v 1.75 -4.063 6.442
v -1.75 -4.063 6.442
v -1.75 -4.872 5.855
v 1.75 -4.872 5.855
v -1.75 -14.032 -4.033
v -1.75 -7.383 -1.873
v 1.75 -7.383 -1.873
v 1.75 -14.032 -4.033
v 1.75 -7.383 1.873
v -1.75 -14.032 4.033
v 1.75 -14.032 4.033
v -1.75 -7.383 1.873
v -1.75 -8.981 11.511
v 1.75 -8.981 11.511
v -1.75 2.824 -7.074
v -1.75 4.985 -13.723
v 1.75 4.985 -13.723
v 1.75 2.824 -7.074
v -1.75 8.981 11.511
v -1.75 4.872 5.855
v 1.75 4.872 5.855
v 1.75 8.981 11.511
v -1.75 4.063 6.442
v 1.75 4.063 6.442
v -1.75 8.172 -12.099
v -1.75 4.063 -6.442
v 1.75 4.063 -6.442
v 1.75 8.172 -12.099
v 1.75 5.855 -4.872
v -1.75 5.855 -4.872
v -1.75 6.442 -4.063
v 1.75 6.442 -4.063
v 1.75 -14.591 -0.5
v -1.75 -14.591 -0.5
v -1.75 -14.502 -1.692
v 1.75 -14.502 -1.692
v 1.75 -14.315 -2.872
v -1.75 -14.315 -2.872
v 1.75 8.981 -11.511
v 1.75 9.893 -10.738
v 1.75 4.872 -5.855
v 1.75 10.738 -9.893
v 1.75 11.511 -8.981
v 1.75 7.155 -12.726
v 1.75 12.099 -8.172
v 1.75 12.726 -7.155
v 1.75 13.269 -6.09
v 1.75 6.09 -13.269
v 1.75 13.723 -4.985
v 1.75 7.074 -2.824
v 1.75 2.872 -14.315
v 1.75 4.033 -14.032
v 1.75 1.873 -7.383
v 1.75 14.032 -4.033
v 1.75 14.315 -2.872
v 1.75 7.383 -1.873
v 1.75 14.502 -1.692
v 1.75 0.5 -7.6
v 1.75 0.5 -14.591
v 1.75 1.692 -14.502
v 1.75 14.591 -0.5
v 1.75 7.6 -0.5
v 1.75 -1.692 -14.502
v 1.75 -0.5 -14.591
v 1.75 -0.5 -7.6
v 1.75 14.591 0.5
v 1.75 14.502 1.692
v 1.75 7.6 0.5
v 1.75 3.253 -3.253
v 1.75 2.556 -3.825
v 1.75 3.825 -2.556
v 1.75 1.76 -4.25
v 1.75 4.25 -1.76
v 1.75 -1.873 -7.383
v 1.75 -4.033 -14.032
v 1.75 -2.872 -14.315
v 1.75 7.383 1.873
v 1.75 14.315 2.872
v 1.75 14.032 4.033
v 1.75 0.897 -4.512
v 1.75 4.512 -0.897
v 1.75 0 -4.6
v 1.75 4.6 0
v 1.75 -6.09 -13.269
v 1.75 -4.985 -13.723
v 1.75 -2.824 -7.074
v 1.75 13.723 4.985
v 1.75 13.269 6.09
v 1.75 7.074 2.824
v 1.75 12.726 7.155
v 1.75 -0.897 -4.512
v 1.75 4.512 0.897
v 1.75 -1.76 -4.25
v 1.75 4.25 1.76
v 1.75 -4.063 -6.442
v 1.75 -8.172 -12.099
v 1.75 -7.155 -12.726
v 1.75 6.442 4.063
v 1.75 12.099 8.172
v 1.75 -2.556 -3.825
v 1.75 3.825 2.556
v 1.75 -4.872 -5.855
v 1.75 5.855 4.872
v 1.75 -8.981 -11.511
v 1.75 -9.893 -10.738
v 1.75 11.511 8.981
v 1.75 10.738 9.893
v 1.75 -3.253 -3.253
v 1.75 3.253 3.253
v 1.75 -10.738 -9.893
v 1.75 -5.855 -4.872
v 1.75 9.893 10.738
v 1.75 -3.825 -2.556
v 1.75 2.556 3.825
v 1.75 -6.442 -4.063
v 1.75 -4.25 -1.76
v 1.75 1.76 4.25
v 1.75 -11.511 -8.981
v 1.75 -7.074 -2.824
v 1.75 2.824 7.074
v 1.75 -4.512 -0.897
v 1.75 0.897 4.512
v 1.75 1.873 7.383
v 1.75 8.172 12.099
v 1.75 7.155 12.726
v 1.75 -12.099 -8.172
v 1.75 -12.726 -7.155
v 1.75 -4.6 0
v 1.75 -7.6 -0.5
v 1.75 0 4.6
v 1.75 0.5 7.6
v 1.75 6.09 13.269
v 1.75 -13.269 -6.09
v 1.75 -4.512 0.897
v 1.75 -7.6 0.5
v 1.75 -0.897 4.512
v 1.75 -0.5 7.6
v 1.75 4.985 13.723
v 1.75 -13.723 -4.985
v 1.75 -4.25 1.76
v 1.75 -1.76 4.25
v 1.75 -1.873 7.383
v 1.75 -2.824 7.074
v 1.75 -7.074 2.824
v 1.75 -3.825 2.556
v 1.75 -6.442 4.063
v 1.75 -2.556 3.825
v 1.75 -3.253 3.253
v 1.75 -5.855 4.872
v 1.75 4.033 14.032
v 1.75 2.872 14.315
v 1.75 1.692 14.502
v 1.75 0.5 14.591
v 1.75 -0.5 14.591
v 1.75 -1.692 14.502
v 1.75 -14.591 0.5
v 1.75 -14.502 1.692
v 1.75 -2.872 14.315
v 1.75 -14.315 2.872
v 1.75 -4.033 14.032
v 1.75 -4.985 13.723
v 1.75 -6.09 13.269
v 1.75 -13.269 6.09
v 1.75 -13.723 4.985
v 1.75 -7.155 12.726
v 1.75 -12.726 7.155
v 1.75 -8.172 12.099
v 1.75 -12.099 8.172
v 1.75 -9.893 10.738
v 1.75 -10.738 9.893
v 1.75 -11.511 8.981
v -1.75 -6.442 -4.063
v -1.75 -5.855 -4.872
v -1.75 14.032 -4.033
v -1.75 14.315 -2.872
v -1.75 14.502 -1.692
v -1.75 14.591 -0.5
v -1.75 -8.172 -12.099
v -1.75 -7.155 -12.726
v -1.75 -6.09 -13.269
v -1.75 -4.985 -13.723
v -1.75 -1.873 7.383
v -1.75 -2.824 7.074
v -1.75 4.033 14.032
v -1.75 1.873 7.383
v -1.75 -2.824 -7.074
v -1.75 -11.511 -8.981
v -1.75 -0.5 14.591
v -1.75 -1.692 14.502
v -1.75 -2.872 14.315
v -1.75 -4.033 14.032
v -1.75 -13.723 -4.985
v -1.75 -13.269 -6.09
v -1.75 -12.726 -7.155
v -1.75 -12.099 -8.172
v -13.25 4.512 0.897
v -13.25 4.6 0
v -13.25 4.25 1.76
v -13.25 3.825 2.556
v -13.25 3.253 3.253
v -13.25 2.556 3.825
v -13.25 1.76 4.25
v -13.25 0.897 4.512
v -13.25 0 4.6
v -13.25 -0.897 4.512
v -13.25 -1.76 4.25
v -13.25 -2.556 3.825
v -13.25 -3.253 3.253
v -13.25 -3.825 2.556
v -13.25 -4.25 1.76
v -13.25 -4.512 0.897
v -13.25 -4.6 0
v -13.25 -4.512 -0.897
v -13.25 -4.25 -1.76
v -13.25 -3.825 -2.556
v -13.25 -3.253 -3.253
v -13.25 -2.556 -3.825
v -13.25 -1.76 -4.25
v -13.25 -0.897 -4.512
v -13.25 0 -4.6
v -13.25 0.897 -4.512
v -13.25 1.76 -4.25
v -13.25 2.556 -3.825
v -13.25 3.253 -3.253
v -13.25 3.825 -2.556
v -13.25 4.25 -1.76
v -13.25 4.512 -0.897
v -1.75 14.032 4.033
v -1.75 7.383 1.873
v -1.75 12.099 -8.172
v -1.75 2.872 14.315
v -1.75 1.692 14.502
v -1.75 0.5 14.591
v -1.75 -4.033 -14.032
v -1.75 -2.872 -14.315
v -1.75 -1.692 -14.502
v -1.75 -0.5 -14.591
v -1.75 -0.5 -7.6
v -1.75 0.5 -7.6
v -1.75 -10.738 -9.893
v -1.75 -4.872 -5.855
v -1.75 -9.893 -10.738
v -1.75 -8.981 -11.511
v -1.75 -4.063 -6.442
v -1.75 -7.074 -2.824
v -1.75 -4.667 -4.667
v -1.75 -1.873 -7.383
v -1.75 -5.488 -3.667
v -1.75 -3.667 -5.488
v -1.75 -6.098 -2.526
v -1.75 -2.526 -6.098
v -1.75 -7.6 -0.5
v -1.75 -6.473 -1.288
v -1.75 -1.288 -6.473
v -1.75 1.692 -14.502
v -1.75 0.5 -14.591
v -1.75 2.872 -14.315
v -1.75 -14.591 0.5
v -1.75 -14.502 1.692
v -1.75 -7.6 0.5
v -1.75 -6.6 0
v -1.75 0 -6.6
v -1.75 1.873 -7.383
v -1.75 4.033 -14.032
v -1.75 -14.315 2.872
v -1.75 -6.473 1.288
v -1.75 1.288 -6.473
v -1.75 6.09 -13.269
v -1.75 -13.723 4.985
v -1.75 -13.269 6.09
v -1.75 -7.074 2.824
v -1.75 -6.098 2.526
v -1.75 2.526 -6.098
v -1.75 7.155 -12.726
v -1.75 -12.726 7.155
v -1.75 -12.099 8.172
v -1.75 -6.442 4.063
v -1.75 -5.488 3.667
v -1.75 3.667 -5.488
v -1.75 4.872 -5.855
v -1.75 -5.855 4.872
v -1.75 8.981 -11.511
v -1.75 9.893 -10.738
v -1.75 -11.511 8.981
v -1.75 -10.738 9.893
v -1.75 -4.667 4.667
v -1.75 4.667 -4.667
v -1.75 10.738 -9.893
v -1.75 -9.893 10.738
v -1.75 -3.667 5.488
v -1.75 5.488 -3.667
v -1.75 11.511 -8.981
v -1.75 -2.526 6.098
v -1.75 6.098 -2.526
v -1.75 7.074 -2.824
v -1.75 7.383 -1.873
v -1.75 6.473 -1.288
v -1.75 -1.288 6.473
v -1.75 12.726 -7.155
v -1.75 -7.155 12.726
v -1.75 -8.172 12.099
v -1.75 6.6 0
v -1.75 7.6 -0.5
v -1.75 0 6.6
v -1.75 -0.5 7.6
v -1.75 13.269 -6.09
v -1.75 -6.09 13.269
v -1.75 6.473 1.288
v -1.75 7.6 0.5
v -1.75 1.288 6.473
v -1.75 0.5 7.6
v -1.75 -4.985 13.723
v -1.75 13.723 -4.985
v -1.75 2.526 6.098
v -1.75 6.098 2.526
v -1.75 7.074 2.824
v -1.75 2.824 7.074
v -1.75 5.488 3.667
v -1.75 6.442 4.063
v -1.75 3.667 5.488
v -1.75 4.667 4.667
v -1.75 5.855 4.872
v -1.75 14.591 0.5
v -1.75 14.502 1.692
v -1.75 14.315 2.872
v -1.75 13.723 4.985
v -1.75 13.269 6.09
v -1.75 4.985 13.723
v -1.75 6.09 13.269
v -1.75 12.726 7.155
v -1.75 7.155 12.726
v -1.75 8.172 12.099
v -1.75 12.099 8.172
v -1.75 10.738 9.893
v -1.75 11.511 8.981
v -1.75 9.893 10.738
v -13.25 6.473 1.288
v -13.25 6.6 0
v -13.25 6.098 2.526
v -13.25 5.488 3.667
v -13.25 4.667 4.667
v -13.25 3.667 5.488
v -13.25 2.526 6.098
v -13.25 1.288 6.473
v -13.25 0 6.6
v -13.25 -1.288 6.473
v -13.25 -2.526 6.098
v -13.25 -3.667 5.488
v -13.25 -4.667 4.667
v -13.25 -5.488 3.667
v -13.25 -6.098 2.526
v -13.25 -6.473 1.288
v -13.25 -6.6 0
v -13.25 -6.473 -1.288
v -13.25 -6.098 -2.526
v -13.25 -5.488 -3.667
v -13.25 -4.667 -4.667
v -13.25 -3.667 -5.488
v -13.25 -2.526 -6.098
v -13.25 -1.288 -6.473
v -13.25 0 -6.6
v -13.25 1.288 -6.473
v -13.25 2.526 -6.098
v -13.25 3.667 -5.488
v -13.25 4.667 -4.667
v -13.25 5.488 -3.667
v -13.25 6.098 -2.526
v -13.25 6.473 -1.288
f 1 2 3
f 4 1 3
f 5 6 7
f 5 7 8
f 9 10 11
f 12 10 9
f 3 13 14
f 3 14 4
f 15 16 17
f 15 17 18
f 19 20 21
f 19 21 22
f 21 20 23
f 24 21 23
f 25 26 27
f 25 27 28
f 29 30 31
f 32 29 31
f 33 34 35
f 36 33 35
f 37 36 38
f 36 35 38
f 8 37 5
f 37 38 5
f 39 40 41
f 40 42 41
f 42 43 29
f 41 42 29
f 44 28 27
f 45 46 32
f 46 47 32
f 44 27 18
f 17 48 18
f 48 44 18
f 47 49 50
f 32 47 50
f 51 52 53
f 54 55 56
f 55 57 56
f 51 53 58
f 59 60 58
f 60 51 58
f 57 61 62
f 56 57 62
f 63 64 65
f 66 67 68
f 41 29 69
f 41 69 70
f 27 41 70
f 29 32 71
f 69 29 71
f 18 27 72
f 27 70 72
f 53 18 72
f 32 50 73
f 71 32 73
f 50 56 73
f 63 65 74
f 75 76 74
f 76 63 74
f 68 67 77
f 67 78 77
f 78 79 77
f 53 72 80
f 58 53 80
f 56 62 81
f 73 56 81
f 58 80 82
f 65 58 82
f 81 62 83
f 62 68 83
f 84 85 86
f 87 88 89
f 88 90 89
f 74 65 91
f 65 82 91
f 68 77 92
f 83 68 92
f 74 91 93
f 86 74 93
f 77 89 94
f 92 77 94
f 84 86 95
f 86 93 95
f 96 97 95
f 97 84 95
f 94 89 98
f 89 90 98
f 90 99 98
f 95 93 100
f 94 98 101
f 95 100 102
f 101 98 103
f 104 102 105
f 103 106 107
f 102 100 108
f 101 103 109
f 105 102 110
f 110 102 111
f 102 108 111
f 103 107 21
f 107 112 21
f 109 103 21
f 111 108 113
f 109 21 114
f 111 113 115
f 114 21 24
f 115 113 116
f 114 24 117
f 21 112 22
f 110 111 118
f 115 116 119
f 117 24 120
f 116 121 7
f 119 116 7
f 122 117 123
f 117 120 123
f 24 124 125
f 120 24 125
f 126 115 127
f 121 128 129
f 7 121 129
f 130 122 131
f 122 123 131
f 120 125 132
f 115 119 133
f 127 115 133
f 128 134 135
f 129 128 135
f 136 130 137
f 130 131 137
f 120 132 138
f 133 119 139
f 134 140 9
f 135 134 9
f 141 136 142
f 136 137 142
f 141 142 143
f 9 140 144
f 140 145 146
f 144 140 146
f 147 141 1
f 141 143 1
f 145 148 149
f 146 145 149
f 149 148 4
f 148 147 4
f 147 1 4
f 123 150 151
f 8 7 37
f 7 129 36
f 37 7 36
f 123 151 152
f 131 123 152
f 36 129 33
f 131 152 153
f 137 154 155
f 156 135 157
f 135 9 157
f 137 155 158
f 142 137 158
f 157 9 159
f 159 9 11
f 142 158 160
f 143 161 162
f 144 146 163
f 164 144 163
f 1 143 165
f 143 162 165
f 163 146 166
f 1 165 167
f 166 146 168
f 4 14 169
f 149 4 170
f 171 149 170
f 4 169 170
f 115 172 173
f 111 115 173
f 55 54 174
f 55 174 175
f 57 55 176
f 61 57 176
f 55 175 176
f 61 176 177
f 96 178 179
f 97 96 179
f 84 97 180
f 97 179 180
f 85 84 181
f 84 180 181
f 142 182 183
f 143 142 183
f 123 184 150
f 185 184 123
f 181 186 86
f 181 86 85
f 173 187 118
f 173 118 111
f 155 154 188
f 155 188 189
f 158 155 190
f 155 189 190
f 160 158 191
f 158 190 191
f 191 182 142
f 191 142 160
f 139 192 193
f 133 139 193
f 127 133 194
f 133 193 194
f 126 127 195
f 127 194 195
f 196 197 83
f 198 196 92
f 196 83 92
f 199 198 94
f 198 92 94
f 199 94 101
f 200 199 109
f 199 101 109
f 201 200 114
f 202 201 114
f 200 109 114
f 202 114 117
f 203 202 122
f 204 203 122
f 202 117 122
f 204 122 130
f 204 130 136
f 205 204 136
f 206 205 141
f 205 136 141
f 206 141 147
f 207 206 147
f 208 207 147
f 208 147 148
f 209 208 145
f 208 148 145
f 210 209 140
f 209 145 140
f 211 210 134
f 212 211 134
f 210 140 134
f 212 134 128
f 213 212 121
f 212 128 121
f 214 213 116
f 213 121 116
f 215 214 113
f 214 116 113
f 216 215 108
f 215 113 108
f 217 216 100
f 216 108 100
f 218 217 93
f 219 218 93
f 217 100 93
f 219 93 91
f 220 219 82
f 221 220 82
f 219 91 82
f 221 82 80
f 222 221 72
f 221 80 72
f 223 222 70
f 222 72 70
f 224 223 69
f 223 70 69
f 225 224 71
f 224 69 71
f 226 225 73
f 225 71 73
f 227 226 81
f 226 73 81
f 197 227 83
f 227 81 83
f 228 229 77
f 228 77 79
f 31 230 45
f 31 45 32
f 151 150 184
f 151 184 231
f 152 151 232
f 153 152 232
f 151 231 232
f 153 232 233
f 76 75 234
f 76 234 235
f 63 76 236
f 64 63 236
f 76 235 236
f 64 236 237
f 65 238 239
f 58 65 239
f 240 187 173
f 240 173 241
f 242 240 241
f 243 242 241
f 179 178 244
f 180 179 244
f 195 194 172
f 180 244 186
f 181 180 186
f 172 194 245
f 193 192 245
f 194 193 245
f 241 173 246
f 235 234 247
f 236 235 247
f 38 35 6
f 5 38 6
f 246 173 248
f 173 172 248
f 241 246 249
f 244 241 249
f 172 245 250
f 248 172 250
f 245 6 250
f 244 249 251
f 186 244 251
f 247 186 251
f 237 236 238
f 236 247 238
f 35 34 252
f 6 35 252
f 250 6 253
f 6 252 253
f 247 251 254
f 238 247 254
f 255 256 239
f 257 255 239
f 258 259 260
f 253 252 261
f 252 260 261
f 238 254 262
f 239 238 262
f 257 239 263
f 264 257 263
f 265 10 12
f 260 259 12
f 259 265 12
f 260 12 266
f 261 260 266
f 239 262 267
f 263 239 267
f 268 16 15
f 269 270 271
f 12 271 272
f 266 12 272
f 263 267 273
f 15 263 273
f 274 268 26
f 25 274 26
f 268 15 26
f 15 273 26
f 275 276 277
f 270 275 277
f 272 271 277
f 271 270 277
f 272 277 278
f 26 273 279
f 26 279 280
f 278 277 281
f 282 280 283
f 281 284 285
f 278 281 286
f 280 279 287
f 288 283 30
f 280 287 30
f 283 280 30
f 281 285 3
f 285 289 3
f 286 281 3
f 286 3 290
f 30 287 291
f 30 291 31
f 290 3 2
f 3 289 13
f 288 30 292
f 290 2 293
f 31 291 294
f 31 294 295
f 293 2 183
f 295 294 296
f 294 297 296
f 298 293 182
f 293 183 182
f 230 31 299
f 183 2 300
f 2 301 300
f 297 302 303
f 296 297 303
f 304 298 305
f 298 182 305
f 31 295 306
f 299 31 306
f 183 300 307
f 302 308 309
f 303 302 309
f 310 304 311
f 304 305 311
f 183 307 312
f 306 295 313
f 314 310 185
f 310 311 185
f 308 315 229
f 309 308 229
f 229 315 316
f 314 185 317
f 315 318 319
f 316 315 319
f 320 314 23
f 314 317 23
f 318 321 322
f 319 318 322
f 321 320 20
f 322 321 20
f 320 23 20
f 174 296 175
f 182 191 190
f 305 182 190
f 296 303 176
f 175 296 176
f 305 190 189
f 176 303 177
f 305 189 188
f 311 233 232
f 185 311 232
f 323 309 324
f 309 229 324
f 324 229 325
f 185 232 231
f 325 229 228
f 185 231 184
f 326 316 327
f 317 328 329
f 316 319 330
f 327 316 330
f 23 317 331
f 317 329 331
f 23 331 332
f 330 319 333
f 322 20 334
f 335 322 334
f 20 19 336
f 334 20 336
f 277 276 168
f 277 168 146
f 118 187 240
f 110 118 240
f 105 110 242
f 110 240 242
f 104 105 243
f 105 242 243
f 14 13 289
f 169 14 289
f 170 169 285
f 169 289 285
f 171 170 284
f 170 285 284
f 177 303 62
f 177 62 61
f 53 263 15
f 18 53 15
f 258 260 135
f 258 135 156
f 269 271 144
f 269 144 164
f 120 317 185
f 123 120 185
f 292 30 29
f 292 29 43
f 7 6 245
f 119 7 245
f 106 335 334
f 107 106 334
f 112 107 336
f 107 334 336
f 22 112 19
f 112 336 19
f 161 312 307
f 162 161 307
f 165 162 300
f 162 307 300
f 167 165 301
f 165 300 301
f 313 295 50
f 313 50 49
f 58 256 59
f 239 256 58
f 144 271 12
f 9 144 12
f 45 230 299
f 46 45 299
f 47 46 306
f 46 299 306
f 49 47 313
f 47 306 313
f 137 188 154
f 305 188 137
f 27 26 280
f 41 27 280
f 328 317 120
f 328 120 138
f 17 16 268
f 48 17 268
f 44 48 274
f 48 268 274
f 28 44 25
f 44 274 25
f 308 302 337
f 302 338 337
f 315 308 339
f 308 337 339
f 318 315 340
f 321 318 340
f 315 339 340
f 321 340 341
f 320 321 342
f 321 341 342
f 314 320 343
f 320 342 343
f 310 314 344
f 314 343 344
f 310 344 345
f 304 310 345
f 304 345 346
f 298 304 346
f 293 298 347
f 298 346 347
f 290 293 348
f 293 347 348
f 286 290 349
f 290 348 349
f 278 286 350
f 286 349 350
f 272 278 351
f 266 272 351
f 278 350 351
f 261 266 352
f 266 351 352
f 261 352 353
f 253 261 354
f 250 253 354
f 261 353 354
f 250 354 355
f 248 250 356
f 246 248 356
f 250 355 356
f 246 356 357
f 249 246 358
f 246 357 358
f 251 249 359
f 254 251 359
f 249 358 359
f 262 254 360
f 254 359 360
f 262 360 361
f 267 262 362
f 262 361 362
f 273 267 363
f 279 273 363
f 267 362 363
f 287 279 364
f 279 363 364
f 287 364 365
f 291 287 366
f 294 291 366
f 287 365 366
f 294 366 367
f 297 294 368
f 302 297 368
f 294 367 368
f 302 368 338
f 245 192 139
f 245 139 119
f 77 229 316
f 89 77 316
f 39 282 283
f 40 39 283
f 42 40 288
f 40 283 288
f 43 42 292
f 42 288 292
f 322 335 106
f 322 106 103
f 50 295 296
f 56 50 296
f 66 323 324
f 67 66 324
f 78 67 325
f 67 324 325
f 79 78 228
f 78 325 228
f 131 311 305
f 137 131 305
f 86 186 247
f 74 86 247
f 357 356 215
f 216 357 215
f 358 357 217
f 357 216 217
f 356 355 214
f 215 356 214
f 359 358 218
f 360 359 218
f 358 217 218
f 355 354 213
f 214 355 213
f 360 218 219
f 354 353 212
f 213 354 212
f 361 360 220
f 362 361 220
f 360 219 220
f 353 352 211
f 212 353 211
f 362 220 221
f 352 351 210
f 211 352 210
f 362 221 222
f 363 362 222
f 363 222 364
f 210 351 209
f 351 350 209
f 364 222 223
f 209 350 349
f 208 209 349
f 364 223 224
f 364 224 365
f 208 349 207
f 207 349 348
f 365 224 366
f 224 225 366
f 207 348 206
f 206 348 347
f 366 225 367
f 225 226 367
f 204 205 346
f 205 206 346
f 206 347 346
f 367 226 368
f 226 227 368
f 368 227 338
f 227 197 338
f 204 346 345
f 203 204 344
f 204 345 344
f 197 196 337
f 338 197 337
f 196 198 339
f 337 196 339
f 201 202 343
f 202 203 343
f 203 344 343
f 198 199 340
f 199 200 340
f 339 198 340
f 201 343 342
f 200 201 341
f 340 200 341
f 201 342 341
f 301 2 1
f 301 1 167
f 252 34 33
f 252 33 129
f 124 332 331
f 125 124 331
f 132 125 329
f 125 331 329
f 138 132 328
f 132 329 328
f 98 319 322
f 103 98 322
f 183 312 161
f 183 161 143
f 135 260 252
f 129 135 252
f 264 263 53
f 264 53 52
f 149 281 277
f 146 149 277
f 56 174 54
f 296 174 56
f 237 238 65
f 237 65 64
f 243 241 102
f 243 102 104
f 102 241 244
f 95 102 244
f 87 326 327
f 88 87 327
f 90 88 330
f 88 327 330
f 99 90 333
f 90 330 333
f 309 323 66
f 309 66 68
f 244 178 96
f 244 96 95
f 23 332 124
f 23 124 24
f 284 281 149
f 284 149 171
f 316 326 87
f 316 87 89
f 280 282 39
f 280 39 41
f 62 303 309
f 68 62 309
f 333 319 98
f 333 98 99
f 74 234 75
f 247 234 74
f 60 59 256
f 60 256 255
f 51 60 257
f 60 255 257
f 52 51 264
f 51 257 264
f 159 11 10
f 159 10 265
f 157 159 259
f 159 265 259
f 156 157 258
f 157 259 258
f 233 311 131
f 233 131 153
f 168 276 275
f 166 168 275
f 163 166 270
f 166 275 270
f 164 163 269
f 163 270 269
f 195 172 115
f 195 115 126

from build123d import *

# Parameters (mm, degrees)
POCKET_DEPTH       = 3.5
POLARPATTERN_COUNT = 20


with BuildPart() as part:
    # Sketch → Revolution (revolve)
    with BuildSketch(Plane.XY):
        Polygon((1.75, 4.6), (1.75, 14.6), (0, 14.6), (-1.75, 14.6), (-1.75, 6.6), (-13.25, 6.6), (-13.25, 4.6), align=None)
    revolve(axis=Axis((0, 0, 0), (1, 0, 0)))

    # Sketch001 (on Face4 of Revolution) → Pocket (cut)
    with BuildSketch(Plane(origin=(-1.75, 0, 0), x_dir=(0, -1, 0), z_dir=(-1, 0, 0))):
        Polygon((-0.5, 15.6), (0.5, 15.6), (0.5, 7.6), (0, 7.6), (-0.5, 7.6), align=None)
    pocket = extrude(amount=-POCKET_DEPTH, mode=Mode.SUBTRACT)

    # PolarPattern: Pocket ×20 about axis
    polarpattern_axis = Axis((-1.75, 0, 0), (-1, 0, 0))
    for i in range(1, POLARPATTERN_COUNT):
        add(pocket.rotate(polarpattern_axis, i * 360 / POLARPATTERN_COUNT), mode=Mode.SUBTRACT)


solid = part.part
